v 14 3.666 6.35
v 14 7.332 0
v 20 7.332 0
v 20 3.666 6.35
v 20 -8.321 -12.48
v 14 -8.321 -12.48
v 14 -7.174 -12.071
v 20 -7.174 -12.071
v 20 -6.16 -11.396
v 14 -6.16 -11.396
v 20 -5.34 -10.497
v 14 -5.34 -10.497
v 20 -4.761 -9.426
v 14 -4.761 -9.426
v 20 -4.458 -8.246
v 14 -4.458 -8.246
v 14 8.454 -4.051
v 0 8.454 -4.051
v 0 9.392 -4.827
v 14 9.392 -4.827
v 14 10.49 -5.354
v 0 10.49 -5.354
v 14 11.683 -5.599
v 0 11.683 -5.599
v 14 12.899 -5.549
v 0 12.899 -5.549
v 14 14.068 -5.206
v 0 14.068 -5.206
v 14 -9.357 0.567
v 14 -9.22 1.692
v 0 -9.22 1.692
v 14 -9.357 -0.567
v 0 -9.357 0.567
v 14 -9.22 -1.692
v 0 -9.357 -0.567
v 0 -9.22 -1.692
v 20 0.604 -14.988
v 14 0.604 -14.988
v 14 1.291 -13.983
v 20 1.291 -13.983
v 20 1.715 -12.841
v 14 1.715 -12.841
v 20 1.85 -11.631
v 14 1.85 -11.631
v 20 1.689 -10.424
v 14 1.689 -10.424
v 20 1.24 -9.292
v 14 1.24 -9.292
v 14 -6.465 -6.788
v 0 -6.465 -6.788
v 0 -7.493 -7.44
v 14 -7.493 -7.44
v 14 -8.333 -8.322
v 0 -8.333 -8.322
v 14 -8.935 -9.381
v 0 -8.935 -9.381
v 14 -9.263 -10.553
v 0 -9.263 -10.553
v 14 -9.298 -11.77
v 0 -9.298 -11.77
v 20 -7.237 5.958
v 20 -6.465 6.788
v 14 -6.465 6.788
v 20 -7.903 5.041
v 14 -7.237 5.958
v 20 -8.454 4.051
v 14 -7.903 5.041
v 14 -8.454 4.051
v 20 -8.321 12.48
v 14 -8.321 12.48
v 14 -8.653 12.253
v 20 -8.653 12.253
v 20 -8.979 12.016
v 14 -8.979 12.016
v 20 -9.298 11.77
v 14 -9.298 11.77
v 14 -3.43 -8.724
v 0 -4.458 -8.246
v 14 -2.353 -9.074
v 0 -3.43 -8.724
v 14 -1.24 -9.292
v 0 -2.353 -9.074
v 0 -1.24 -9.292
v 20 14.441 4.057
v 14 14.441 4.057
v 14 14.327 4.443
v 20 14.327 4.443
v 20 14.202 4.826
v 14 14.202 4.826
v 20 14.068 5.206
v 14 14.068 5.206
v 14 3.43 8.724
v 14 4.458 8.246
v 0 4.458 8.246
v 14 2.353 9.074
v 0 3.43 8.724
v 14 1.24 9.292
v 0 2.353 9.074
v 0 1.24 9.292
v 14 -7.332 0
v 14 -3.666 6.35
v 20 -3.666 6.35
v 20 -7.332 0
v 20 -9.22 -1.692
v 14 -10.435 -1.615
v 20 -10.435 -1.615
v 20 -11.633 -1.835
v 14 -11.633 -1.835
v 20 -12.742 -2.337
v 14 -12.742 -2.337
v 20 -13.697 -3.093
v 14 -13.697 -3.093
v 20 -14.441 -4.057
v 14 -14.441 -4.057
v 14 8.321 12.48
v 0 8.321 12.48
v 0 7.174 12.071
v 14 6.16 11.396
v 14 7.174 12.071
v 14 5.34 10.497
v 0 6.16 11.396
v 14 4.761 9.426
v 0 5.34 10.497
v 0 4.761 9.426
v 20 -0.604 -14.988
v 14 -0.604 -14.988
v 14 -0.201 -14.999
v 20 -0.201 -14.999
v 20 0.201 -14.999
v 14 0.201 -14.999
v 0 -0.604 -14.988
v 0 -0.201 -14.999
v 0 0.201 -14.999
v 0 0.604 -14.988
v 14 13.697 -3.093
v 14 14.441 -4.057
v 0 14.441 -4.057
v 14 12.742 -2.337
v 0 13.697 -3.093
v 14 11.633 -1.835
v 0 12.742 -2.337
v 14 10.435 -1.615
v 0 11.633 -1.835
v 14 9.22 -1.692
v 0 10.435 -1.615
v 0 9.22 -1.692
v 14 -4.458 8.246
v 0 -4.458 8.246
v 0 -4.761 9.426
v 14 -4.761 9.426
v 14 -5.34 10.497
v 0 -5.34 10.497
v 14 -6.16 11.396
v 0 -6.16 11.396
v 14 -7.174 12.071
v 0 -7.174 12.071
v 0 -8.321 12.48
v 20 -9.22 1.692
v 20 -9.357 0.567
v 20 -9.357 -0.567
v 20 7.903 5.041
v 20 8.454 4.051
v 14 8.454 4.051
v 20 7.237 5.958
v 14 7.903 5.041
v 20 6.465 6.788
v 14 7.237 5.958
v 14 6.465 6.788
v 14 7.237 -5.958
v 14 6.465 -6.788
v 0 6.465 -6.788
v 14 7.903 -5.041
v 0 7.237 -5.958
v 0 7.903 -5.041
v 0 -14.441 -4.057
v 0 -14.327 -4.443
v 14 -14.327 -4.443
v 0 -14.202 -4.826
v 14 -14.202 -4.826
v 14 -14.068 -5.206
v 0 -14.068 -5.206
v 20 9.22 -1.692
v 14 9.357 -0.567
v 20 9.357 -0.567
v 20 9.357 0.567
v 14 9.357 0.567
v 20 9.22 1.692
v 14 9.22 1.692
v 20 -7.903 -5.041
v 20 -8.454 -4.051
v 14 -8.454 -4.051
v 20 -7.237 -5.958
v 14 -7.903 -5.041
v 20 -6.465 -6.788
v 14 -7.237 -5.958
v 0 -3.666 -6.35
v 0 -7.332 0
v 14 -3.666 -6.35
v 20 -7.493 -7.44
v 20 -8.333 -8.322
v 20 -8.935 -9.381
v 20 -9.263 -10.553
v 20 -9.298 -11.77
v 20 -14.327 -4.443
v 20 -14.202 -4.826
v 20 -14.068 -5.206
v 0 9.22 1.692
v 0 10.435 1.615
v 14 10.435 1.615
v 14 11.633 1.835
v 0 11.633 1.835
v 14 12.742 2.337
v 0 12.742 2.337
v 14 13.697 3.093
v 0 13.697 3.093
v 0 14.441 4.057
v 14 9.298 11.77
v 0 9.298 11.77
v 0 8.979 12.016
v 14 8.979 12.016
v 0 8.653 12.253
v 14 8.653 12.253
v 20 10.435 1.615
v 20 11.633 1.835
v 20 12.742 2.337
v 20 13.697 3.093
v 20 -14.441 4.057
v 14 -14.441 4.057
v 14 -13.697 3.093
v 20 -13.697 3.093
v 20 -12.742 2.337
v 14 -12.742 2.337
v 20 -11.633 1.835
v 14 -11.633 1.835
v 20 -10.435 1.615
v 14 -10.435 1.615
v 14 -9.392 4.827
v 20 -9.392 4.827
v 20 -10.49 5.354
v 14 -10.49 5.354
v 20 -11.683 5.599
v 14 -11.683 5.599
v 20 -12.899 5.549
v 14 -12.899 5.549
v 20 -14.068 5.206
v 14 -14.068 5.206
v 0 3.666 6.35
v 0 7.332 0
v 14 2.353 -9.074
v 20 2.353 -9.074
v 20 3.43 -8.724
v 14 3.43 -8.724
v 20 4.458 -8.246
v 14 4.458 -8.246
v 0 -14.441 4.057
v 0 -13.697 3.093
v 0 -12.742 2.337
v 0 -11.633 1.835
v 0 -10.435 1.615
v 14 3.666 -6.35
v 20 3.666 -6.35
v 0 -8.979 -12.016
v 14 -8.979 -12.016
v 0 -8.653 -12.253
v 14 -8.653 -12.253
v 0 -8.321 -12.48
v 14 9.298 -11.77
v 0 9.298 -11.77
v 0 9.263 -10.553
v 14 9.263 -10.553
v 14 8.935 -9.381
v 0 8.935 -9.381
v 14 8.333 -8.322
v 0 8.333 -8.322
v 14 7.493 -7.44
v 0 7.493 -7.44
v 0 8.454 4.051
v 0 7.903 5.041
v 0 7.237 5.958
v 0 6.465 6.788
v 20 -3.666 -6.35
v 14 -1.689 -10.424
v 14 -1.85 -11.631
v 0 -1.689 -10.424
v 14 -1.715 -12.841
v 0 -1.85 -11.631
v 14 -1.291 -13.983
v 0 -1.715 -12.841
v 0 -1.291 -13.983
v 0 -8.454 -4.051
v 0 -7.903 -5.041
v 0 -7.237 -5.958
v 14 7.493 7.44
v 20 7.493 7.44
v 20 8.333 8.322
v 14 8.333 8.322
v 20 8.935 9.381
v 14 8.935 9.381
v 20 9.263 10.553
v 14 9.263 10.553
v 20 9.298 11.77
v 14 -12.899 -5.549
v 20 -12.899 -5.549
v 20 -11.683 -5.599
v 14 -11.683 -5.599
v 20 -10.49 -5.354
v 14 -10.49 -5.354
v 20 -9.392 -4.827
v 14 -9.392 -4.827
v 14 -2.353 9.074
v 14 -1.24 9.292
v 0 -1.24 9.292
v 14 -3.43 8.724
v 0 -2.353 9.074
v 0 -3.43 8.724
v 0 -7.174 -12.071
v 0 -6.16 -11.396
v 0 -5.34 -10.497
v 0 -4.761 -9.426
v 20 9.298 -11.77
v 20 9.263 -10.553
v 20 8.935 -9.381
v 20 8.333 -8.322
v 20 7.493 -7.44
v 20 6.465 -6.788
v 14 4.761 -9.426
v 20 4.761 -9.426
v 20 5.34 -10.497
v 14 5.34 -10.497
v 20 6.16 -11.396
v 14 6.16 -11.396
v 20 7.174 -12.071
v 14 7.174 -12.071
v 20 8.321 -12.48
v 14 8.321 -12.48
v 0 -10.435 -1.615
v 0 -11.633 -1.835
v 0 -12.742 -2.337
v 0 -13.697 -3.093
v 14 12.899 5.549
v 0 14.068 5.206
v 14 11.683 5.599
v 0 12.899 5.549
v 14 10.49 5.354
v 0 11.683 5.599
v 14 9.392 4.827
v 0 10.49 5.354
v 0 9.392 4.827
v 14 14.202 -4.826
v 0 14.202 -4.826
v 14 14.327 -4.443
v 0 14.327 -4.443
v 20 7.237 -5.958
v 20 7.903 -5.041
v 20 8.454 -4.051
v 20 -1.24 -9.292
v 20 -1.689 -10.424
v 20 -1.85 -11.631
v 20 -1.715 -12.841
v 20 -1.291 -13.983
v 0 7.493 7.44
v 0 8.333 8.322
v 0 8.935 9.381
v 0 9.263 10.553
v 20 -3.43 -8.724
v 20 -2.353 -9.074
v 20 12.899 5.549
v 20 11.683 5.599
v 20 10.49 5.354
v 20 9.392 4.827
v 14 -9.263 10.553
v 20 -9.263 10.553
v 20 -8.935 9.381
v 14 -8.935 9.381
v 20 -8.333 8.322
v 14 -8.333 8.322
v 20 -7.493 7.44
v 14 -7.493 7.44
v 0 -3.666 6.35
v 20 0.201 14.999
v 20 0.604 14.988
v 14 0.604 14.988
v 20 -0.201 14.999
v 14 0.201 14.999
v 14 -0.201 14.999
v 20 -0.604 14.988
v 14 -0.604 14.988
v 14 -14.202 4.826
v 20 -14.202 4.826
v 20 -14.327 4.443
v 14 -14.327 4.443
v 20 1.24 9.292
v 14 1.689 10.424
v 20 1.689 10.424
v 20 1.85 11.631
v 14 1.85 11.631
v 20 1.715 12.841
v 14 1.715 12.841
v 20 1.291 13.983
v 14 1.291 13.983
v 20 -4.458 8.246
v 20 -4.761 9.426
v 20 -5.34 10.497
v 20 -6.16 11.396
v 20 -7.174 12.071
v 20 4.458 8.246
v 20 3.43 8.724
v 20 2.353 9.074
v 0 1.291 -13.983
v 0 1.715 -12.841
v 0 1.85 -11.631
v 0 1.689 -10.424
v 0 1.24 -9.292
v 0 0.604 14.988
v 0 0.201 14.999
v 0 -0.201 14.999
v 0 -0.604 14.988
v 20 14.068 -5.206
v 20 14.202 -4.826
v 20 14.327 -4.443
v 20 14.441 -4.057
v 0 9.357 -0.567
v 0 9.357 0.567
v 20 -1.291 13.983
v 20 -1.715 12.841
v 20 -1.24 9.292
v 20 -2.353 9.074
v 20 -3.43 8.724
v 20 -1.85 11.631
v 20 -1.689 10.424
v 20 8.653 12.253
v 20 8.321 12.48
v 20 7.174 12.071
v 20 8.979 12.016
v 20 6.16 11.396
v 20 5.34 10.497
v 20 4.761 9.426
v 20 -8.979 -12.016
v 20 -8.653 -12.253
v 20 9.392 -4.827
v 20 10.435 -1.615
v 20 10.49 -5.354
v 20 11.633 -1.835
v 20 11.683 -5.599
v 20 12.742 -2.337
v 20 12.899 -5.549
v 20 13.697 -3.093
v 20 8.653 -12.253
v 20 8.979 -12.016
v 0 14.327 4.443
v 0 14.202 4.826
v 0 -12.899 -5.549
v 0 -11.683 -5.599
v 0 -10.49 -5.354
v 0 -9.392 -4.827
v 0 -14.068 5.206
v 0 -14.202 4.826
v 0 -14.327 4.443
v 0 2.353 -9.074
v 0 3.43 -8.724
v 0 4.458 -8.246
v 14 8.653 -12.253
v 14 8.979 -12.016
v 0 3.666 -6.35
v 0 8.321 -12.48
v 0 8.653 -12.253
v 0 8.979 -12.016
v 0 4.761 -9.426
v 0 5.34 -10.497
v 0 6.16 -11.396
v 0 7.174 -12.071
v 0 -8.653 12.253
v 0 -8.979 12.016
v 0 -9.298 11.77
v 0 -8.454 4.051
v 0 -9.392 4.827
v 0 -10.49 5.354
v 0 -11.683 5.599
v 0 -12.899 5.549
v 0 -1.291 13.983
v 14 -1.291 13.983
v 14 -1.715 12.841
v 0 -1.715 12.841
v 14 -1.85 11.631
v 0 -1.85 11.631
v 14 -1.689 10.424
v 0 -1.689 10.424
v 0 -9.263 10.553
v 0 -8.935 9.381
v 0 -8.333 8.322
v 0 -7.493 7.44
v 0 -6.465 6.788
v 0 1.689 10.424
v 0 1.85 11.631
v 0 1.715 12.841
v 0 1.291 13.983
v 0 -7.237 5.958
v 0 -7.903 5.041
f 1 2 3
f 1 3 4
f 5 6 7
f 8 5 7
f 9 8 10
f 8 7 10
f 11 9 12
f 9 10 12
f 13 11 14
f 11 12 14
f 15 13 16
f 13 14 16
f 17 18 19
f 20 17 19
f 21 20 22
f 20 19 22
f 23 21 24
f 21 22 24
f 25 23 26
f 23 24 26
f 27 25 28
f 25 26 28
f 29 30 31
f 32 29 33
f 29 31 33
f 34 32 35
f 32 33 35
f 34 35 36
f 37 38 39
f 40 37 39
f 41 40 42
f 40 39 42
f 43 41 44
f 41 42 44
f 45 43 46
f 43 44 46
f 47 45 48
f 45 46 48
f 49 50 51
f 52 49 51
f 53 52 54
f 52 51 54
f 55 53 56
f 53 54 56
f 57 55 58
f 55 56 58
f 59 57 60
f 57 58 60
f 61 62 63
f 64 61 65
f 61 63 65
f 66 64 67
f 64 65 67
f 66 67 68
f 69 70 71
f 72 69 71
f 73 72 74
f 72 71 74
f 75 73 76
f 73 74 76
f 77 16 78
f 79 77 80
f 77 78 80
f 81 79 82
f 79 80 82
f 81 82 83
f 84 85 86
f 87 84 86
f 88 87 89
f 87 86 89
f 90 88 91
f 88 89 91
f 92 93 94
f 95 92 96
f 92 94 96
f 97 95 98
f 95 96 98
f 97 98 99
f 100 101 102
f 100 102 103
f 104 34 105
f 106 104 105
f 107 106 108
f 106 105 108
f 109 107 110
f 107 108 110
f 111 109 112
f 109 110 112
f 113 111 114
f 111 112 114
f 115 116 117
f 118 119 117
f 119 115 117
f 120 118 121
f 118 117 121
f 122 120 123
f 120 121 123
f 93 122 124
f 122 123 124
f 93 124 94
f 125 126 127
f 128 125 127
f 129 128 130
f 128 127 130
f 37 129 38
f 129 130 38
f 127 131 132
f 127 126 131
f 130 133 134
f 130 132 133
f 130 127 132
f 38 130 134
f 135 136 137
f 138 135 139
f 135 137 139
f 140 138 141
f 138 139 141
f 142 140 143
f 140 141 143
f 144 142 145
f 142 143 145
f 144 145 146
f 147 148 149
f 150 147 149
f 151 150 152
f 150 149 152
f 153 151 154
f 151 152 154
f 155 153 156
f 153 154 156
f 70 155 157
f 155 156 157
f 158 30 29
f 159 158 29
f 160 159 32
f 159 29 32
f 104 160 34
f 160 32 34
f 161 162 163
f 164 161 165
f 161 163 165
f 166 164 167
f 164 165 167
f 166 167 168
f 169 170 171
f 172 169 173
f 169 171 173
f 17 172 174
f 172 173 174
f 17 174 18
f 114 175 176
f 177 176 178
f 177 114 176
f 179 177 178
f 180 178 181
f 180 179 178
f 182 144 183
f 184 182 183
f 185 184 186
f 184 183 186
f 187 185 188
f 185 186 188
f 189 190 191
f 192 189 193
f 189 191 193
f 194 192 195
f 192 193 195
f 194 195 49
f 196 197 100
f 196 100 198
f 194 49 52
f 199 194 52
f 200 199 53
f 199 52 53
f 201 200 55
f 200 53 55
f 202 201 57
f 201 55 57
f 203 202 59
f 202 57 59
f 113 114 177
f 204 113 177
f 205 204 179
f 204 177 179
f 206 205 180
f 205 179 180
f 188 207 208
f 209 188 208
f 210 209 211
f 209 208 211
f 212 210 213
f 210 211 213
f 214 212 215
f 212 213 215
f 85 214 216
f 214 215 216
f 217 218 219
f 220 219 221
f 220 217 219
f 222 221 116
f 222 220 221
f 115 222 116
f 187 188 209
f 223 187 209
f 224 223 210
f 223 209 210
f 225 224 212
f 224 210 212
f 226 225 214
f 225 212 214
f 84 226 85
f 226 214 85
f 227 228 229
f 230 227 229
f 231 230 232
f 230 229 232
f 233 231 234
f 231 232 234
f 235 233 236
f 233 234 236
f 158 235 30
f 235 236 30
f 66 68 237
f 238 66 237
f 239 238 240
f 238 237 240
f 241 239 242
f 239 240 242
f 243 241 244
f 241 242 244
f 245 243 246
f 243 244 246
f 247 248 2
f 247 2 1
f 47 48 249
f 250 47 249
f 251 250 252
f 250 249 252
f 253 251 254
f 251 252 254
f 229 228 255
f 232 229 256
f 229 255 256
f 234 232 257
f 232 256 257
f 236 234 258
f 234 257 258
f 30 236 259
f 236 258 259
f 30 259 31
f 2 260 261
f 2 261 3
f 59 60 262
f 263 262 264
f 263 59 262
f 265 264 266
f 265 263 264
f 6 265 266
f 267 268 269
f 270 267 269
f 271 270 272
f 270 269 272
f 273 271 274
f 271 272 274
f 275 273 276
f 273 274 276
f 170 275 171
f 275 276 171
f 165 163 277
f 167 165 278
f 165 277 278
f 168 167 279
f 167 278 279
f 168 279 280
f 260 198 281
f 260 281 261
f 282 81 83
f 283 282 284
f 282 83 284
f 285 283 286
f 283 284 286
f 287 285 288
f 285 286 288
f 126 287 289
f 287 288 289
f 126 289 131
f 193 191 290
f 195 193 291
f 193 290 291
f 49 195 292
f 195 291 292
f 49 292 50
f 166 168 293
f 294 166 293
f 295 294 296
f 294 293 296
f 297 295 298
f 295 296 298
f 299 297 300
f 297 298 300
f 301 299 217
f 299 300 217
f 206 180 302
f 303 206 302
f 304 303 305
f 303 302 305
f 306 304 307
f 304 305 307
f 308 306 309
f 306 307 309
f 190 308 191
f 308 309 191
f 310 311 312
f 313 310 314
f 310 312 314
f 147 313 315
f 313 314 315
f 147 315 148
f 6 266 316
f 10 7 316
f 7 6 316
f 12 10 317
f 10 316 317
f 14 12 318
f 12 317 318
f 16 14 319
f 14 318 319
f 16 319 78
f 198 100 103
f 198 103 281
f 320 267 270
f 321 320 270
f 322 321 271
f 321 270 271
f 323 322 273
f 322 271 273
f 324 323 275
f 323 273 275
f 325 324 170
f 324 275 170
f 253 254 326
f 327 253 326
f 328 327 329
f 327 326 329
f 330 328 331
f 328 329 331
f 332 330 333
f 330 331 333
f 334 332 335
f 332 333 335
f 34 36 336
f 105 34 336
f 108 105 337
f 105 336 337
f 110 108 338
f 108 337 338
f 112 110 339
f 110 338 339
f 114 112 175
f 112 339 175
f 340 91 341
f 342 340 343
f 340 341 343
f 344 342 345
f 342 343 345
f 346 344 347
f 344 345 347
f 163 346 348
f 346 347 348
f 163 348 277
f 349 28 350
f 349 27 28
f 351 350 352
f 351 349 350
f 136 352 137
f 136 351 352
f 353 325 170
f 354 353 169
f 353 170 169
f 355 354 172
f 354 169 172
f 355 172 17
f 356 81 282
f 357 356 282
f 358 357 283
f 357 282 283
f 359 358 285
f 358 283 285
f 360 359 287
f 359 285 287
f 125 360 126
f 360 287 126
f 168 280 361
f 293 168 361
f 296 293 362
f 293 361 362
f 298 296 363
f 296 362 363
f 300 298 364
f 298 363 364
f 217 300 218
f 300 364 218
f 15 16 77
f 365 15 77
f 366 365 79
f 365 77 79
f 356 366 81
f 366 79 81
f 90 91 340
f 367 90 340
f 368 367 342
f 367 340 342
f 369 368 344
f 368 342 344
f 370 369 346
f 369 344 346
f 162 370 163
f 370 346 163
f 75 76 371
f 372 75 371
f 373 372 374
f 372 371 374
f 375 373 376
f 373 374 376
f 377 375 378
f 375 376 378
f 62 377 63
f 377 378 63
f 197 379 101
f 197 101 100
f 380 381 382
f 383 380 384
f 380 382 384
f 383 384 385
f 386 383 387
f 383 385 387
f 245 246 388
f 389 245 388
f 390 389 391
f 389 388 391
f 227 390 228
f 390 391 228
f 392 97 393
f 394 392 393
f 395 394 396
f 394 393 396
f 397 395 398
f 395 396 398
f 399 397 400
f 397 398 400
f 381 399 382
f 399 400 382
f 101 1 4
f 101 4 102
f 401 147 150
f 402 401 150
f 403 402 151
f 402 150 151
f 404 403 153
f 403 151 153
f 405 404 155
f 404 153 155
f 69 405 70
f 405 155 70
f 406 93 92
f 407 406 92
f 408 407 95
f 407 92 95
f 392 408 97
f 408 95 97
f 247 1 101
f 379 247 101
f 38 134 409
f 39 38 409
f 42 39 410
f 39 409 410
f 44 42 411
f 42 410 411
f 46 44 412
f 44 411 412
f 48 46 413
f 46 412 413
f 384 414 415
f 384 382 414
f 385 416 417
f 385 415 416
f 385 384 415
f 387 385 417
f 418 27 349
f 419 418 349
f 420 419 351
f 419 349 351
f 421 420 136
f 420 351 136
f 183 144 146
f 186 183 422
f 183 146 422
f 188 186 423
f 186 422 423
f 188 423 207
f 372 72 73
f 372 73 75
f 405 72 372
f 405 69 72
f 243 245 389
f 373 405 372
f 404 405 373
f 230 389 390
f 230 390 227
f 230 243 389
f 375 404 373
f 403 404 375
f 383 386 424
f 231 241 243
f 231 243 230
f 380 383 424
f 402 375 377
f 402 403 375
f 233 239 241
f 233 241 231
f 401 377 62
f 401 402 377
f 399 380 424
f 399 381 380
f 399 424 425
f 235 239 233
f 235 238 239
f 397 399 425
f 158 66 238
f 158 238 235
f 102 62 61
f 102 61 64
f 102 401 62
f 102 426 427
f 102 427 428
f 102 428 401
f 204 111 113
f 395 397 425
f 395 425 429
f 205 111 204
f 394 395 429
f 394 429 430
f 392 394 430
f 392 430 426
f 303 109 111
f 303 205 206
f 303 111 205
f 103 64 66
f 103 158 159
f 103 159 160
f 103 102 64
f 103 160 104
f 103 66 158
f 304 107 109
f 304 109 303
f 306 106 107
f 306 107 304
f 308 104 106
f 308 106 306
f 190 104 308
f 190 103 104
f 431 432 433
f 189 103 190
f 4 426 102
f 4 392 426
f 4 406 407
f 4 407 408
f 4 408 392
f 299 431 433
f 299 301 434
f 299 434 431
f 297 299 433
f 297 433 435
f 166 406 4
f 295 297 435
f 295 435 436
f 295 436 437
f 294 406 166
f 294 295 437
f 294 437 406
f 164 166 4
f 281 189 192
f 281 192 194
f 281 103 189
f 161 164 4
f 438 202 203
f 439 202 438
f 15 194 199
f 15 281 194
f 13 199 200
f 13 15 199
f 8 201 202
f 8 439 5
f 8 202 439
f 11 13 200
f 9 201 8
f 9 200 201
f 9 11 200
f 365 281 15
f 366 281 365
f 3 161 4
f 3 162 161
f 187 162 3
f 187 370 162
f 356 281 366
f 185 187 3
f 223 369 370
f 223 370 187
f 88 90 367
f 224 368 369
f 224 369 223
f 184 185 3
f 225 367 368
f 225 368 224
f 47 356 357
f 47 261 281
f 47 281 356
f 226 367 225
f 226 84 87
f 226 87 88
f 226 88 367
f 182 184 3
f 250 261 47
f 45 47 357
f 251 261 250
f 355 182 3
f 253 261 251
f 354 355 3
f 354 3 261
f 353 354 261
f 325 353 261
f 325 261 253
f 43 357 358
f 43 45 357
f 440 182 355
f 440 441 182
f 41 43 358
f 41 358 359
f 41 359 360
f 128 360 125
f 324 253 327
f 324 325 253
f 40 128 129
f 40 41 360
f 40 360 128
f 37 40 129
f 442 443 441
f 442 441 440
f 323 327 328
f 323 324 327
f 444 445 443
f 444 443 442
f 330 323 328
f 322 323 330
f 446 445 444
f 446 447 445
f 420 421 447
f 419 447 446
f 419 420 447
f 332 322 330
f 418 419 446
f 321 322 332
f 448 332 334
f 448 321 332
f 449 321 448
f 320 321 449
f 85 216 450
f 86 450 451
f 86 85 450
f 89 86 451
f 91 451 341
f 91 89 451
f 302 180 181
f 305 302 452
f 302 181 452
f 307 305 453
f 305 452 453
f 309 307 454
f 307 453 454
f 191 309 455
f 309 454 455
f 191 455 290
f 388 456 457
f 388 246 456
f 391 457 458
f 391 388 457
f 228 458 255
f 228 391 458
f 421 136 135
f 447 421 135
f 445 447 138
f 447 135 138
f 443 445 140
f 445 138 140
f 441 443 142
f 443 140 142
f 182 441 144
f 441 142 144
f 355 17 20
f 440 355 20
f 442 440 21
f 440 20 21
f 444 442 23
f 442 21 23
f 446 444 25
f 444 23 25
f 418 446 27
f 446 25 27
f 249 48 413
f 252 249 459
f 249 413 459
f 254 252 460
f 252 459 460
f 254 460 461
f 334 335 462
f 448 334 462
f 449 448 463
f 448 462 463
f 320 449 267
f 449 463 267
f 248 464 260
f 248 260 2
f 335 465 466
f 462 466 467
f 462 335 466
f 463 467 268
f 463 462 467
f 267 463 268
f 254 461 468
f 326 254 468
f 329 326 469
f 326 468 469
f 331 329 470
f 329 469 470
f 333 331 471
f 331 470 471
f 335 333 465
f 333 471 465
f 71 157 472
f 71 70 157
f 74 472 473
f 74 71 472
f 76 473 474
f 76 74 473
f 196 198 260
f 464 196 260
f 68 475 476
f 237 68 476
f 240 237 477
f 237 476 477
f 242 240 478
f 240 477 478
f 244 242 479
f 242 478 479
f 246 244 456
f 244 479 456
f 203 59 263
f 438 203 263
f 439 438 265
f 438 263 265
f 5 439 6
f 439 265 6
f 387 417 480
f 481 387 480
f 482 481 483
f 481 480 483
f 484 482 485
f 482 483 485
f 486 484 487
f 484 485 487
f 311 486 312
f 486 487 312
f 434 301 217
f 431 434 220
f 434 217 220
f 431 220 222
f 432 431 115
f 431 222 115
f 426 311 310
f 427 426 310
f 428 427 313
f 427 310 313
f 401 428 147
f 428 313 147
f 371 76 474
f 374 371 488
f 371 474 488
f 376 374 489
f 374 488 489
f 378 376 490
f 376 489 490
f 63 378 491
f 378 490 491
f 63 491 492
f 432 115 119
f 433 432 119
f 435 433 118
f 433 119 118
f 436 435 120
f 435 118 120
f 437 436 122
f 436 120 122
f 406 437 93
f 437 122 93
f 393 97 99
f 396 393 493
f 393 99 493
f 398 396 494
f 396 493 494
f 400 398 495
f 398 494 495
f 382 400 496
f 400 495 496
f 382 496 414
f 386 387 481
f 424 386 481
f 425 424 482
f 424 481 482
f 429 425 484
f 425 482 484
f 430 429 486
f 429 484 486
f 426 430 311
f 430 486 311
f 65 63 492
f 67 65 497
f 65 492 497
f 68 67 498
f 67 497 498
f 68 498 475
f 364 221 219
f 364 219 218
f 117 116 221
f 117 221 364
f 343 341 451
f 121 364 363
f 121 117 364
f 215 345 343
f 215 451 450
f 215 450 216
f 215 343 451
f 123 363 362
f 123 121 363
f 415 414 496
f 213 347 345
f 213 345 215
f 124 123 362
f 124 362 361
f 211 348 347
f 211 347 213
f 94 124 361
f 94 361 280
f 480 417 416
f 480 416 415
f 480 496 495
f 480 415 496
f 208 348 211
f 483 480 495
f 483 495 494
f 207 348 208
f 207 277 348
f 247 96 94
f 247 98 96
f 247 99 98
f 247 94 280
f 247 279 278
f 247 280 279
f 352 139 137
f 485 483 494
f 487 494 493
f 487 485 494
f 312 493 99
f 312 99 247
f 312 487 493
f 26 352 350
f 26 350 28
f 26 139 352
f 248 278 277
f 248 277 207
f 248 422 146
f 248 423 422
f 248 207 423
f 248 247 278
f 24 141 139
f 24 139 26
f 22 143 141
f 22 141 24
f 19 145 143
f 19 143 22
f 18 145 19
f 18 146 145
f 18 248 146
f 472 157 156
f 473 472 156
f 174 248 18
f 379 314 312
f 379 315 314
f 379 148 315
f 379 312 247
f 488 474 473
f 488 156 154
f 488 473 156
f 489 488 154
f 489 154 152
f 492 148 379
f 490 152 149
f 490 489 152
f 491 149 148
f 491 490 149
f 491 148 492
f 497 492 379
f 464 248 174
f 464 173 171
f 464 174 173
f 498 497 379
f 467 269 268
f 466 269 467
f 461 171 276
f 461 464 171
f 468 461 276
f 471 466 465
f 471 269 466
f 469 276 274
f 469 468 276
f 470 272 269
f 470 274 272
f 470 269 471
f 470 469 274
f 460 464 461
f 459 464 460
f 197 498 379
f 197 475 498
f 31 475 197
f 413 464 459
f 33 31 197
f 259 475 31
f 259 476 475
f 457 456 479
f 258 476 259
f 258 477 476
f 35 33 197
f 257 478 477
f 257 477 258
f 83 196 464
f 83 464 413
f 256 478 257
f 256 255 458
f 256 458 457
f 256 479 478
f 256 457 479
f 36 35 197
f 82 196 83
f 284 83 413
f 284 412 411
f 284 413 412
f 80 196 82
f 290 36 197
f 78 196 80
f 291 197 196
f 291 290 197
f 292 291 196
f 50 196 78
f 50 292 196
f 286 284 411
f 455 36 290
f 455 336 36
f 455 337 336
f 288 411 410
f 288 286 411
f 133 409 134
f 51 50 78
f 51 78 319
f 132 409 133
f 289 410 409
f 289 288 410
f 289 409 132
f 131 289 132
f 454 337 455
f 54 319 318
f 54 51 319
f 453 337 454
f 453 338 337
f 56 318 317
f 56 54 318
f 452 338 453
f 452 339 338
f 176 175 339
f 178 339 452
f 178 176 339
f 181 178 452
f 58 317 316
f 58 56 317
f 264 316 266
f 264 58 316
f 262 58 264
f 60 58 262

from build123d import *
from build123d.topology import SkipClean

# Parameters (mm, degrees)
BASPROSKE_W         = 14
BASPROSKE_H         = 15
TOOTHCUT_DEPTH      = 26.416530054
TEETHCUTS_COUNT     = 10
TEETHCUTS_ANGLE     = 324
BORSKE_R            = 5
BORE_DEPTH          = 50.0005588
CUT_EXTRUDE1_DEPTH  = 26.09062294
BOSS_EXTRUDE1_DEPTH = 6


with BuildPart() as part:
    # BasProSke → Base-Revolve (revolve)
    with BuildSketch(Plane(origin=(0, 0, 0), x_dir=(1, 0, 0), z_dir=(0, 1, 0)), mode=Mode.PRIVATE) as base_revolve_sk:
        with Locations((7, 7.5)):
            Rectangle(BASPROSKE_W, BASPROSKE_H)
    revolve(base_revolve_sk.sketch.rotate(Axis((-10, 0, 0), (1, 0, 0)), 180), axis=Axis((-10, 0, 0), (1, 0, 0)))

    # TooCutSke → ToothCut (cut, through all)
    with BuildSketch(Plane(origin=(0, 0, 0), x_dir=(0, 0, -1), z_dir=(1, 0, 0))):
        with BuildLine():
            ThreePointArc((1.691642647, 9.220098761), (0, 9.374), (-1.691642647, 9.220098761))
            ThreePointArc((-1.691642647, 9.220098761), (-2.059354944, 12.219114282), (-4.087513468, 14.458730194))
            ThreePointArc((-4.087513468, 14.458730194), (0, 15.0254), (4.087513468, 14.458730194))
            ThreePointArc((4.087513468, 14.458730194), (2.059354944, 12.219114282), (1.691642647, 9.220098761))
        make_face()
    toothcut = extrude(amount=TOOTHCUT_DEPTH, mode=Mode.SUBTRACT)

    # TeethCuts: ToothCut ×10 about axis
    teethcuts_axis = Axis((-10, 0, 0), (1, 0, 0))
    for i in range(1, TEETHCUTS_COUNT):
        add(toothcut.rotate(teethcuts_axis, i * TEETHCUTS_ANGLE / (TEETHCUTS_COUNT - 1)), mode=Mode.SUBTRACT)

    # BorSke → Bore (cut, symmetric)
    with BuildSketch(Plane(origin=(0, 0, 0), x_dir=(0, 0, -1), z_dir=(1, 0, 0))):
        with Locations(Location((0, 0, 0), (0, 0, 180))):
            Circle(BORSKE_R)
    extrude(amount=BORE_DEPTH, both=True, mode=Mode.SUBTRACT)

    # Sketch1 → Cut-Extrude1 (cut, through all)
    with BuildSketch(Plane(origin=(14, 0, 0), x_dir=(0, 0, -1), z_dir=(1, 0, 0))):
        Polygon((0, -7.332348419), (6.35, -3.666174209), (6.35, 3.666174209), (0, 7.332348419), (-6.35, 3.666174209), (-6.35, -3.666174209), align=None)
    extrude(amount=-CUT_EXTRUDE1_DEPTH, mode=Mode.SUBTRACT)

    # Sketch2 → Boss-Extrude1 (add)
    with SkipClean():  # the faces are left unmerged after this step: merging them gives an invalid solid
        with BuildSketch(Plane(origin=(14, 0, 0), x_dir=(0, 0, -1), z_dir=(1, 0, 0))):
            with BuildLine():
                ThreePointArc((14.987839303, -0.603881639), (15, 0), (14.987839303, 0.603881639))
                ThreePointArc((14.987839303, 0.603881639), (12.239957624, 1.819335924), (9.291581333, 1.240319444))
                ThreePointArc((9.291581333, 1.240319444), (8.915203784, 2.896725305), (8.246088681, 4.45801497))
                ThreePointArc((8.246088681, 4.45801497), (10.971712553, 5.7225929), (12.480369426, 8.321080397))
                ThreePointArc((12.480369426, 8.321080397), (12.135254916, 8.816778784), (11.770463983, 9.298181415))
                ThreePointArc((11.770463983, 9.298181415), (8.832954904, 8.666340261), (6.788005726, 6.464893987))
                ThreePointArc((6.788005726, 6.464893987), (5.509898955, 7.583725305), (4.050870426, 8.453539187))
                ThreePointArc((4.050870426, 8.453539187), (5.512646202, 11.078685739), (5.205822621, 14.067672545))
                ThreePointArc((5.205822621, 14.067672545), (4.635254916, 14.265847744), (4.057171486, 14.440891923))
                ThreePointArc((4.057171486, 14.440891923), (2.052063631, 12.203097177), (1.691642647, 9.220098761))
                ThreePointArc((1.691642647, 9.220098761), (0, 9.374), (-1.691642647, 9.220098761))
                ThreePointArc((-1.691642647, 9.220098761), (-2.052063631, 12.203097177), (-4.057171486, 14.440891923))
                ThreePointArc((-4.057171486, 14.440891923), (-4.635254916, 14.265847744), (-5.205822621, 14.067672545))
                ThreePointArc((-5.205822621, 14.067672545), (-5.512646202, 11.078685739), (-4.050870426, 8.453539187))
                ThreePointArc((-4.050870426, 8.453539187), (-5.509898955, 7.583725305), (-6.788005726, 6.464893987))
                ThreePointArc((-6.788005726, 6.464893987), (-8.832954904, 8.666340261), (-11.770463983, 9.298181415))
                ThreePointArc((-11.770463983, 9.298181415), (-12.135254916, 8.816778784), (-12.480369426, 8.321080397))
                ThreePointArc((-12.480369426, 8.321080397), (-10.971712553, 5.7225929), (-8.246088681, 4.45801497))
                ThreePointArc((-8.246088681, 4.45801497), (-8.915203784, 2.896725305), (-9.291581333, 1.240319444))
                ThreePointArc((-9.291581333, 1.240319444), (-12.239957624, 1.819335924), (-14.987839303, 0.603881639))
                ThreePointArc((-14.987839303, 0.603881639), (-15, 0), (-14.987839303, -0.603881639))
                ThreePointArc((-14.987839303, -0.603881639), (-12.239957624, -1.819335924), (-9.291581333, -1.240319444))
                ThreePointArc((-9.291581333, -1.240319444), (-8.915203784, -2.896725305), (-8.246088681, -4.45801497))
                ThreePointArc((-8.246088681, -4.45801497), (-10.971712553, -5.7225929), (-12.480369426, -8.321080397))
                ThreePointArc((-12.480369426, -8.321080397), (-12.135254916, -8.816778784), (-11.770463983, -9.298181415))
                ThreePointArc((-11.770463983, -9.298181415), (-8.832954904, -8.666340261), (-6.788005726, -6.464893987))
                ThreePointArc((-6.788005726, -6.464893987), (-5.509898955, -7.583725305), (-4.050870426, -8.453539187))
                ThreePointArc((-4.050870426, -8.453539187), (-5.512646202, -11.078685739), (-5.205822621, -14.067672545))
                ThreePointArc((-5.205822621, -14.067672545), (-4.635254916, -14.265847744), (-4.057171486, -14.440891923))
                ThreePointArc((-4.057171486, -14.440891923), (-2.052063631, -12.203097177), (-1.691642647, -9.220098761))
                ThreePointArc((-1.691642647, -9.220098761), (0, -9.374), (1.691642647, -9.220098761))
                ThreePointArc((1.691642647, -9.220098761), (2.052063631, -12.203097177), (4.057171486, -14.440891923))
                ThreePointArc((4.057171486, -14.440891923), (4.635254916, -14.265847744), (5.205822621, -14.067672545))
                ThreePointArc((5.205822621, -14.067672545), (5.512646202, -11.078685739), (4.050870426, -8.453539187))
                ThreePointArc((4.050870426, -8.453539187), (5.509898955, -7.583725305), (6.788005726, -6.464893987))
                ThreePointArc((6.788005726, -6.464893987), (8.832954904, -8.666340261), (11.770463983, -9.298181415))
                ThreePointArc((11.770463983, -9.298181415), (12.135254916, -8.816778784), (12.480369426, -8.321080397))
                ThreePointArc((12.480369426, -8.321080397), (10.971712553, -5.7225929), (8.246088681, -4.45801497))
                ThreePointArc((8.246088681, -4.45801497), (8.915203784, -2.896725305), (9.291581333, -1.240319444))
                ThreePointArc((9.291581333, -1.240319444), (12.239957624, -1.819335924), (14.987839303, -0.603881639))
            make_face()
            Polygon((-6.35, -3.666174209), (0, -7.332348419), (6.35, -3.666174209), (6.35, 3.666174209), (0, 7.332348419), (-6.35, 3.666174209), align=None, mode=Mode.SUBTRACT)
        extrude(amount=BOSS_EXTRUDE1_DEPTH)


solid = part.part
